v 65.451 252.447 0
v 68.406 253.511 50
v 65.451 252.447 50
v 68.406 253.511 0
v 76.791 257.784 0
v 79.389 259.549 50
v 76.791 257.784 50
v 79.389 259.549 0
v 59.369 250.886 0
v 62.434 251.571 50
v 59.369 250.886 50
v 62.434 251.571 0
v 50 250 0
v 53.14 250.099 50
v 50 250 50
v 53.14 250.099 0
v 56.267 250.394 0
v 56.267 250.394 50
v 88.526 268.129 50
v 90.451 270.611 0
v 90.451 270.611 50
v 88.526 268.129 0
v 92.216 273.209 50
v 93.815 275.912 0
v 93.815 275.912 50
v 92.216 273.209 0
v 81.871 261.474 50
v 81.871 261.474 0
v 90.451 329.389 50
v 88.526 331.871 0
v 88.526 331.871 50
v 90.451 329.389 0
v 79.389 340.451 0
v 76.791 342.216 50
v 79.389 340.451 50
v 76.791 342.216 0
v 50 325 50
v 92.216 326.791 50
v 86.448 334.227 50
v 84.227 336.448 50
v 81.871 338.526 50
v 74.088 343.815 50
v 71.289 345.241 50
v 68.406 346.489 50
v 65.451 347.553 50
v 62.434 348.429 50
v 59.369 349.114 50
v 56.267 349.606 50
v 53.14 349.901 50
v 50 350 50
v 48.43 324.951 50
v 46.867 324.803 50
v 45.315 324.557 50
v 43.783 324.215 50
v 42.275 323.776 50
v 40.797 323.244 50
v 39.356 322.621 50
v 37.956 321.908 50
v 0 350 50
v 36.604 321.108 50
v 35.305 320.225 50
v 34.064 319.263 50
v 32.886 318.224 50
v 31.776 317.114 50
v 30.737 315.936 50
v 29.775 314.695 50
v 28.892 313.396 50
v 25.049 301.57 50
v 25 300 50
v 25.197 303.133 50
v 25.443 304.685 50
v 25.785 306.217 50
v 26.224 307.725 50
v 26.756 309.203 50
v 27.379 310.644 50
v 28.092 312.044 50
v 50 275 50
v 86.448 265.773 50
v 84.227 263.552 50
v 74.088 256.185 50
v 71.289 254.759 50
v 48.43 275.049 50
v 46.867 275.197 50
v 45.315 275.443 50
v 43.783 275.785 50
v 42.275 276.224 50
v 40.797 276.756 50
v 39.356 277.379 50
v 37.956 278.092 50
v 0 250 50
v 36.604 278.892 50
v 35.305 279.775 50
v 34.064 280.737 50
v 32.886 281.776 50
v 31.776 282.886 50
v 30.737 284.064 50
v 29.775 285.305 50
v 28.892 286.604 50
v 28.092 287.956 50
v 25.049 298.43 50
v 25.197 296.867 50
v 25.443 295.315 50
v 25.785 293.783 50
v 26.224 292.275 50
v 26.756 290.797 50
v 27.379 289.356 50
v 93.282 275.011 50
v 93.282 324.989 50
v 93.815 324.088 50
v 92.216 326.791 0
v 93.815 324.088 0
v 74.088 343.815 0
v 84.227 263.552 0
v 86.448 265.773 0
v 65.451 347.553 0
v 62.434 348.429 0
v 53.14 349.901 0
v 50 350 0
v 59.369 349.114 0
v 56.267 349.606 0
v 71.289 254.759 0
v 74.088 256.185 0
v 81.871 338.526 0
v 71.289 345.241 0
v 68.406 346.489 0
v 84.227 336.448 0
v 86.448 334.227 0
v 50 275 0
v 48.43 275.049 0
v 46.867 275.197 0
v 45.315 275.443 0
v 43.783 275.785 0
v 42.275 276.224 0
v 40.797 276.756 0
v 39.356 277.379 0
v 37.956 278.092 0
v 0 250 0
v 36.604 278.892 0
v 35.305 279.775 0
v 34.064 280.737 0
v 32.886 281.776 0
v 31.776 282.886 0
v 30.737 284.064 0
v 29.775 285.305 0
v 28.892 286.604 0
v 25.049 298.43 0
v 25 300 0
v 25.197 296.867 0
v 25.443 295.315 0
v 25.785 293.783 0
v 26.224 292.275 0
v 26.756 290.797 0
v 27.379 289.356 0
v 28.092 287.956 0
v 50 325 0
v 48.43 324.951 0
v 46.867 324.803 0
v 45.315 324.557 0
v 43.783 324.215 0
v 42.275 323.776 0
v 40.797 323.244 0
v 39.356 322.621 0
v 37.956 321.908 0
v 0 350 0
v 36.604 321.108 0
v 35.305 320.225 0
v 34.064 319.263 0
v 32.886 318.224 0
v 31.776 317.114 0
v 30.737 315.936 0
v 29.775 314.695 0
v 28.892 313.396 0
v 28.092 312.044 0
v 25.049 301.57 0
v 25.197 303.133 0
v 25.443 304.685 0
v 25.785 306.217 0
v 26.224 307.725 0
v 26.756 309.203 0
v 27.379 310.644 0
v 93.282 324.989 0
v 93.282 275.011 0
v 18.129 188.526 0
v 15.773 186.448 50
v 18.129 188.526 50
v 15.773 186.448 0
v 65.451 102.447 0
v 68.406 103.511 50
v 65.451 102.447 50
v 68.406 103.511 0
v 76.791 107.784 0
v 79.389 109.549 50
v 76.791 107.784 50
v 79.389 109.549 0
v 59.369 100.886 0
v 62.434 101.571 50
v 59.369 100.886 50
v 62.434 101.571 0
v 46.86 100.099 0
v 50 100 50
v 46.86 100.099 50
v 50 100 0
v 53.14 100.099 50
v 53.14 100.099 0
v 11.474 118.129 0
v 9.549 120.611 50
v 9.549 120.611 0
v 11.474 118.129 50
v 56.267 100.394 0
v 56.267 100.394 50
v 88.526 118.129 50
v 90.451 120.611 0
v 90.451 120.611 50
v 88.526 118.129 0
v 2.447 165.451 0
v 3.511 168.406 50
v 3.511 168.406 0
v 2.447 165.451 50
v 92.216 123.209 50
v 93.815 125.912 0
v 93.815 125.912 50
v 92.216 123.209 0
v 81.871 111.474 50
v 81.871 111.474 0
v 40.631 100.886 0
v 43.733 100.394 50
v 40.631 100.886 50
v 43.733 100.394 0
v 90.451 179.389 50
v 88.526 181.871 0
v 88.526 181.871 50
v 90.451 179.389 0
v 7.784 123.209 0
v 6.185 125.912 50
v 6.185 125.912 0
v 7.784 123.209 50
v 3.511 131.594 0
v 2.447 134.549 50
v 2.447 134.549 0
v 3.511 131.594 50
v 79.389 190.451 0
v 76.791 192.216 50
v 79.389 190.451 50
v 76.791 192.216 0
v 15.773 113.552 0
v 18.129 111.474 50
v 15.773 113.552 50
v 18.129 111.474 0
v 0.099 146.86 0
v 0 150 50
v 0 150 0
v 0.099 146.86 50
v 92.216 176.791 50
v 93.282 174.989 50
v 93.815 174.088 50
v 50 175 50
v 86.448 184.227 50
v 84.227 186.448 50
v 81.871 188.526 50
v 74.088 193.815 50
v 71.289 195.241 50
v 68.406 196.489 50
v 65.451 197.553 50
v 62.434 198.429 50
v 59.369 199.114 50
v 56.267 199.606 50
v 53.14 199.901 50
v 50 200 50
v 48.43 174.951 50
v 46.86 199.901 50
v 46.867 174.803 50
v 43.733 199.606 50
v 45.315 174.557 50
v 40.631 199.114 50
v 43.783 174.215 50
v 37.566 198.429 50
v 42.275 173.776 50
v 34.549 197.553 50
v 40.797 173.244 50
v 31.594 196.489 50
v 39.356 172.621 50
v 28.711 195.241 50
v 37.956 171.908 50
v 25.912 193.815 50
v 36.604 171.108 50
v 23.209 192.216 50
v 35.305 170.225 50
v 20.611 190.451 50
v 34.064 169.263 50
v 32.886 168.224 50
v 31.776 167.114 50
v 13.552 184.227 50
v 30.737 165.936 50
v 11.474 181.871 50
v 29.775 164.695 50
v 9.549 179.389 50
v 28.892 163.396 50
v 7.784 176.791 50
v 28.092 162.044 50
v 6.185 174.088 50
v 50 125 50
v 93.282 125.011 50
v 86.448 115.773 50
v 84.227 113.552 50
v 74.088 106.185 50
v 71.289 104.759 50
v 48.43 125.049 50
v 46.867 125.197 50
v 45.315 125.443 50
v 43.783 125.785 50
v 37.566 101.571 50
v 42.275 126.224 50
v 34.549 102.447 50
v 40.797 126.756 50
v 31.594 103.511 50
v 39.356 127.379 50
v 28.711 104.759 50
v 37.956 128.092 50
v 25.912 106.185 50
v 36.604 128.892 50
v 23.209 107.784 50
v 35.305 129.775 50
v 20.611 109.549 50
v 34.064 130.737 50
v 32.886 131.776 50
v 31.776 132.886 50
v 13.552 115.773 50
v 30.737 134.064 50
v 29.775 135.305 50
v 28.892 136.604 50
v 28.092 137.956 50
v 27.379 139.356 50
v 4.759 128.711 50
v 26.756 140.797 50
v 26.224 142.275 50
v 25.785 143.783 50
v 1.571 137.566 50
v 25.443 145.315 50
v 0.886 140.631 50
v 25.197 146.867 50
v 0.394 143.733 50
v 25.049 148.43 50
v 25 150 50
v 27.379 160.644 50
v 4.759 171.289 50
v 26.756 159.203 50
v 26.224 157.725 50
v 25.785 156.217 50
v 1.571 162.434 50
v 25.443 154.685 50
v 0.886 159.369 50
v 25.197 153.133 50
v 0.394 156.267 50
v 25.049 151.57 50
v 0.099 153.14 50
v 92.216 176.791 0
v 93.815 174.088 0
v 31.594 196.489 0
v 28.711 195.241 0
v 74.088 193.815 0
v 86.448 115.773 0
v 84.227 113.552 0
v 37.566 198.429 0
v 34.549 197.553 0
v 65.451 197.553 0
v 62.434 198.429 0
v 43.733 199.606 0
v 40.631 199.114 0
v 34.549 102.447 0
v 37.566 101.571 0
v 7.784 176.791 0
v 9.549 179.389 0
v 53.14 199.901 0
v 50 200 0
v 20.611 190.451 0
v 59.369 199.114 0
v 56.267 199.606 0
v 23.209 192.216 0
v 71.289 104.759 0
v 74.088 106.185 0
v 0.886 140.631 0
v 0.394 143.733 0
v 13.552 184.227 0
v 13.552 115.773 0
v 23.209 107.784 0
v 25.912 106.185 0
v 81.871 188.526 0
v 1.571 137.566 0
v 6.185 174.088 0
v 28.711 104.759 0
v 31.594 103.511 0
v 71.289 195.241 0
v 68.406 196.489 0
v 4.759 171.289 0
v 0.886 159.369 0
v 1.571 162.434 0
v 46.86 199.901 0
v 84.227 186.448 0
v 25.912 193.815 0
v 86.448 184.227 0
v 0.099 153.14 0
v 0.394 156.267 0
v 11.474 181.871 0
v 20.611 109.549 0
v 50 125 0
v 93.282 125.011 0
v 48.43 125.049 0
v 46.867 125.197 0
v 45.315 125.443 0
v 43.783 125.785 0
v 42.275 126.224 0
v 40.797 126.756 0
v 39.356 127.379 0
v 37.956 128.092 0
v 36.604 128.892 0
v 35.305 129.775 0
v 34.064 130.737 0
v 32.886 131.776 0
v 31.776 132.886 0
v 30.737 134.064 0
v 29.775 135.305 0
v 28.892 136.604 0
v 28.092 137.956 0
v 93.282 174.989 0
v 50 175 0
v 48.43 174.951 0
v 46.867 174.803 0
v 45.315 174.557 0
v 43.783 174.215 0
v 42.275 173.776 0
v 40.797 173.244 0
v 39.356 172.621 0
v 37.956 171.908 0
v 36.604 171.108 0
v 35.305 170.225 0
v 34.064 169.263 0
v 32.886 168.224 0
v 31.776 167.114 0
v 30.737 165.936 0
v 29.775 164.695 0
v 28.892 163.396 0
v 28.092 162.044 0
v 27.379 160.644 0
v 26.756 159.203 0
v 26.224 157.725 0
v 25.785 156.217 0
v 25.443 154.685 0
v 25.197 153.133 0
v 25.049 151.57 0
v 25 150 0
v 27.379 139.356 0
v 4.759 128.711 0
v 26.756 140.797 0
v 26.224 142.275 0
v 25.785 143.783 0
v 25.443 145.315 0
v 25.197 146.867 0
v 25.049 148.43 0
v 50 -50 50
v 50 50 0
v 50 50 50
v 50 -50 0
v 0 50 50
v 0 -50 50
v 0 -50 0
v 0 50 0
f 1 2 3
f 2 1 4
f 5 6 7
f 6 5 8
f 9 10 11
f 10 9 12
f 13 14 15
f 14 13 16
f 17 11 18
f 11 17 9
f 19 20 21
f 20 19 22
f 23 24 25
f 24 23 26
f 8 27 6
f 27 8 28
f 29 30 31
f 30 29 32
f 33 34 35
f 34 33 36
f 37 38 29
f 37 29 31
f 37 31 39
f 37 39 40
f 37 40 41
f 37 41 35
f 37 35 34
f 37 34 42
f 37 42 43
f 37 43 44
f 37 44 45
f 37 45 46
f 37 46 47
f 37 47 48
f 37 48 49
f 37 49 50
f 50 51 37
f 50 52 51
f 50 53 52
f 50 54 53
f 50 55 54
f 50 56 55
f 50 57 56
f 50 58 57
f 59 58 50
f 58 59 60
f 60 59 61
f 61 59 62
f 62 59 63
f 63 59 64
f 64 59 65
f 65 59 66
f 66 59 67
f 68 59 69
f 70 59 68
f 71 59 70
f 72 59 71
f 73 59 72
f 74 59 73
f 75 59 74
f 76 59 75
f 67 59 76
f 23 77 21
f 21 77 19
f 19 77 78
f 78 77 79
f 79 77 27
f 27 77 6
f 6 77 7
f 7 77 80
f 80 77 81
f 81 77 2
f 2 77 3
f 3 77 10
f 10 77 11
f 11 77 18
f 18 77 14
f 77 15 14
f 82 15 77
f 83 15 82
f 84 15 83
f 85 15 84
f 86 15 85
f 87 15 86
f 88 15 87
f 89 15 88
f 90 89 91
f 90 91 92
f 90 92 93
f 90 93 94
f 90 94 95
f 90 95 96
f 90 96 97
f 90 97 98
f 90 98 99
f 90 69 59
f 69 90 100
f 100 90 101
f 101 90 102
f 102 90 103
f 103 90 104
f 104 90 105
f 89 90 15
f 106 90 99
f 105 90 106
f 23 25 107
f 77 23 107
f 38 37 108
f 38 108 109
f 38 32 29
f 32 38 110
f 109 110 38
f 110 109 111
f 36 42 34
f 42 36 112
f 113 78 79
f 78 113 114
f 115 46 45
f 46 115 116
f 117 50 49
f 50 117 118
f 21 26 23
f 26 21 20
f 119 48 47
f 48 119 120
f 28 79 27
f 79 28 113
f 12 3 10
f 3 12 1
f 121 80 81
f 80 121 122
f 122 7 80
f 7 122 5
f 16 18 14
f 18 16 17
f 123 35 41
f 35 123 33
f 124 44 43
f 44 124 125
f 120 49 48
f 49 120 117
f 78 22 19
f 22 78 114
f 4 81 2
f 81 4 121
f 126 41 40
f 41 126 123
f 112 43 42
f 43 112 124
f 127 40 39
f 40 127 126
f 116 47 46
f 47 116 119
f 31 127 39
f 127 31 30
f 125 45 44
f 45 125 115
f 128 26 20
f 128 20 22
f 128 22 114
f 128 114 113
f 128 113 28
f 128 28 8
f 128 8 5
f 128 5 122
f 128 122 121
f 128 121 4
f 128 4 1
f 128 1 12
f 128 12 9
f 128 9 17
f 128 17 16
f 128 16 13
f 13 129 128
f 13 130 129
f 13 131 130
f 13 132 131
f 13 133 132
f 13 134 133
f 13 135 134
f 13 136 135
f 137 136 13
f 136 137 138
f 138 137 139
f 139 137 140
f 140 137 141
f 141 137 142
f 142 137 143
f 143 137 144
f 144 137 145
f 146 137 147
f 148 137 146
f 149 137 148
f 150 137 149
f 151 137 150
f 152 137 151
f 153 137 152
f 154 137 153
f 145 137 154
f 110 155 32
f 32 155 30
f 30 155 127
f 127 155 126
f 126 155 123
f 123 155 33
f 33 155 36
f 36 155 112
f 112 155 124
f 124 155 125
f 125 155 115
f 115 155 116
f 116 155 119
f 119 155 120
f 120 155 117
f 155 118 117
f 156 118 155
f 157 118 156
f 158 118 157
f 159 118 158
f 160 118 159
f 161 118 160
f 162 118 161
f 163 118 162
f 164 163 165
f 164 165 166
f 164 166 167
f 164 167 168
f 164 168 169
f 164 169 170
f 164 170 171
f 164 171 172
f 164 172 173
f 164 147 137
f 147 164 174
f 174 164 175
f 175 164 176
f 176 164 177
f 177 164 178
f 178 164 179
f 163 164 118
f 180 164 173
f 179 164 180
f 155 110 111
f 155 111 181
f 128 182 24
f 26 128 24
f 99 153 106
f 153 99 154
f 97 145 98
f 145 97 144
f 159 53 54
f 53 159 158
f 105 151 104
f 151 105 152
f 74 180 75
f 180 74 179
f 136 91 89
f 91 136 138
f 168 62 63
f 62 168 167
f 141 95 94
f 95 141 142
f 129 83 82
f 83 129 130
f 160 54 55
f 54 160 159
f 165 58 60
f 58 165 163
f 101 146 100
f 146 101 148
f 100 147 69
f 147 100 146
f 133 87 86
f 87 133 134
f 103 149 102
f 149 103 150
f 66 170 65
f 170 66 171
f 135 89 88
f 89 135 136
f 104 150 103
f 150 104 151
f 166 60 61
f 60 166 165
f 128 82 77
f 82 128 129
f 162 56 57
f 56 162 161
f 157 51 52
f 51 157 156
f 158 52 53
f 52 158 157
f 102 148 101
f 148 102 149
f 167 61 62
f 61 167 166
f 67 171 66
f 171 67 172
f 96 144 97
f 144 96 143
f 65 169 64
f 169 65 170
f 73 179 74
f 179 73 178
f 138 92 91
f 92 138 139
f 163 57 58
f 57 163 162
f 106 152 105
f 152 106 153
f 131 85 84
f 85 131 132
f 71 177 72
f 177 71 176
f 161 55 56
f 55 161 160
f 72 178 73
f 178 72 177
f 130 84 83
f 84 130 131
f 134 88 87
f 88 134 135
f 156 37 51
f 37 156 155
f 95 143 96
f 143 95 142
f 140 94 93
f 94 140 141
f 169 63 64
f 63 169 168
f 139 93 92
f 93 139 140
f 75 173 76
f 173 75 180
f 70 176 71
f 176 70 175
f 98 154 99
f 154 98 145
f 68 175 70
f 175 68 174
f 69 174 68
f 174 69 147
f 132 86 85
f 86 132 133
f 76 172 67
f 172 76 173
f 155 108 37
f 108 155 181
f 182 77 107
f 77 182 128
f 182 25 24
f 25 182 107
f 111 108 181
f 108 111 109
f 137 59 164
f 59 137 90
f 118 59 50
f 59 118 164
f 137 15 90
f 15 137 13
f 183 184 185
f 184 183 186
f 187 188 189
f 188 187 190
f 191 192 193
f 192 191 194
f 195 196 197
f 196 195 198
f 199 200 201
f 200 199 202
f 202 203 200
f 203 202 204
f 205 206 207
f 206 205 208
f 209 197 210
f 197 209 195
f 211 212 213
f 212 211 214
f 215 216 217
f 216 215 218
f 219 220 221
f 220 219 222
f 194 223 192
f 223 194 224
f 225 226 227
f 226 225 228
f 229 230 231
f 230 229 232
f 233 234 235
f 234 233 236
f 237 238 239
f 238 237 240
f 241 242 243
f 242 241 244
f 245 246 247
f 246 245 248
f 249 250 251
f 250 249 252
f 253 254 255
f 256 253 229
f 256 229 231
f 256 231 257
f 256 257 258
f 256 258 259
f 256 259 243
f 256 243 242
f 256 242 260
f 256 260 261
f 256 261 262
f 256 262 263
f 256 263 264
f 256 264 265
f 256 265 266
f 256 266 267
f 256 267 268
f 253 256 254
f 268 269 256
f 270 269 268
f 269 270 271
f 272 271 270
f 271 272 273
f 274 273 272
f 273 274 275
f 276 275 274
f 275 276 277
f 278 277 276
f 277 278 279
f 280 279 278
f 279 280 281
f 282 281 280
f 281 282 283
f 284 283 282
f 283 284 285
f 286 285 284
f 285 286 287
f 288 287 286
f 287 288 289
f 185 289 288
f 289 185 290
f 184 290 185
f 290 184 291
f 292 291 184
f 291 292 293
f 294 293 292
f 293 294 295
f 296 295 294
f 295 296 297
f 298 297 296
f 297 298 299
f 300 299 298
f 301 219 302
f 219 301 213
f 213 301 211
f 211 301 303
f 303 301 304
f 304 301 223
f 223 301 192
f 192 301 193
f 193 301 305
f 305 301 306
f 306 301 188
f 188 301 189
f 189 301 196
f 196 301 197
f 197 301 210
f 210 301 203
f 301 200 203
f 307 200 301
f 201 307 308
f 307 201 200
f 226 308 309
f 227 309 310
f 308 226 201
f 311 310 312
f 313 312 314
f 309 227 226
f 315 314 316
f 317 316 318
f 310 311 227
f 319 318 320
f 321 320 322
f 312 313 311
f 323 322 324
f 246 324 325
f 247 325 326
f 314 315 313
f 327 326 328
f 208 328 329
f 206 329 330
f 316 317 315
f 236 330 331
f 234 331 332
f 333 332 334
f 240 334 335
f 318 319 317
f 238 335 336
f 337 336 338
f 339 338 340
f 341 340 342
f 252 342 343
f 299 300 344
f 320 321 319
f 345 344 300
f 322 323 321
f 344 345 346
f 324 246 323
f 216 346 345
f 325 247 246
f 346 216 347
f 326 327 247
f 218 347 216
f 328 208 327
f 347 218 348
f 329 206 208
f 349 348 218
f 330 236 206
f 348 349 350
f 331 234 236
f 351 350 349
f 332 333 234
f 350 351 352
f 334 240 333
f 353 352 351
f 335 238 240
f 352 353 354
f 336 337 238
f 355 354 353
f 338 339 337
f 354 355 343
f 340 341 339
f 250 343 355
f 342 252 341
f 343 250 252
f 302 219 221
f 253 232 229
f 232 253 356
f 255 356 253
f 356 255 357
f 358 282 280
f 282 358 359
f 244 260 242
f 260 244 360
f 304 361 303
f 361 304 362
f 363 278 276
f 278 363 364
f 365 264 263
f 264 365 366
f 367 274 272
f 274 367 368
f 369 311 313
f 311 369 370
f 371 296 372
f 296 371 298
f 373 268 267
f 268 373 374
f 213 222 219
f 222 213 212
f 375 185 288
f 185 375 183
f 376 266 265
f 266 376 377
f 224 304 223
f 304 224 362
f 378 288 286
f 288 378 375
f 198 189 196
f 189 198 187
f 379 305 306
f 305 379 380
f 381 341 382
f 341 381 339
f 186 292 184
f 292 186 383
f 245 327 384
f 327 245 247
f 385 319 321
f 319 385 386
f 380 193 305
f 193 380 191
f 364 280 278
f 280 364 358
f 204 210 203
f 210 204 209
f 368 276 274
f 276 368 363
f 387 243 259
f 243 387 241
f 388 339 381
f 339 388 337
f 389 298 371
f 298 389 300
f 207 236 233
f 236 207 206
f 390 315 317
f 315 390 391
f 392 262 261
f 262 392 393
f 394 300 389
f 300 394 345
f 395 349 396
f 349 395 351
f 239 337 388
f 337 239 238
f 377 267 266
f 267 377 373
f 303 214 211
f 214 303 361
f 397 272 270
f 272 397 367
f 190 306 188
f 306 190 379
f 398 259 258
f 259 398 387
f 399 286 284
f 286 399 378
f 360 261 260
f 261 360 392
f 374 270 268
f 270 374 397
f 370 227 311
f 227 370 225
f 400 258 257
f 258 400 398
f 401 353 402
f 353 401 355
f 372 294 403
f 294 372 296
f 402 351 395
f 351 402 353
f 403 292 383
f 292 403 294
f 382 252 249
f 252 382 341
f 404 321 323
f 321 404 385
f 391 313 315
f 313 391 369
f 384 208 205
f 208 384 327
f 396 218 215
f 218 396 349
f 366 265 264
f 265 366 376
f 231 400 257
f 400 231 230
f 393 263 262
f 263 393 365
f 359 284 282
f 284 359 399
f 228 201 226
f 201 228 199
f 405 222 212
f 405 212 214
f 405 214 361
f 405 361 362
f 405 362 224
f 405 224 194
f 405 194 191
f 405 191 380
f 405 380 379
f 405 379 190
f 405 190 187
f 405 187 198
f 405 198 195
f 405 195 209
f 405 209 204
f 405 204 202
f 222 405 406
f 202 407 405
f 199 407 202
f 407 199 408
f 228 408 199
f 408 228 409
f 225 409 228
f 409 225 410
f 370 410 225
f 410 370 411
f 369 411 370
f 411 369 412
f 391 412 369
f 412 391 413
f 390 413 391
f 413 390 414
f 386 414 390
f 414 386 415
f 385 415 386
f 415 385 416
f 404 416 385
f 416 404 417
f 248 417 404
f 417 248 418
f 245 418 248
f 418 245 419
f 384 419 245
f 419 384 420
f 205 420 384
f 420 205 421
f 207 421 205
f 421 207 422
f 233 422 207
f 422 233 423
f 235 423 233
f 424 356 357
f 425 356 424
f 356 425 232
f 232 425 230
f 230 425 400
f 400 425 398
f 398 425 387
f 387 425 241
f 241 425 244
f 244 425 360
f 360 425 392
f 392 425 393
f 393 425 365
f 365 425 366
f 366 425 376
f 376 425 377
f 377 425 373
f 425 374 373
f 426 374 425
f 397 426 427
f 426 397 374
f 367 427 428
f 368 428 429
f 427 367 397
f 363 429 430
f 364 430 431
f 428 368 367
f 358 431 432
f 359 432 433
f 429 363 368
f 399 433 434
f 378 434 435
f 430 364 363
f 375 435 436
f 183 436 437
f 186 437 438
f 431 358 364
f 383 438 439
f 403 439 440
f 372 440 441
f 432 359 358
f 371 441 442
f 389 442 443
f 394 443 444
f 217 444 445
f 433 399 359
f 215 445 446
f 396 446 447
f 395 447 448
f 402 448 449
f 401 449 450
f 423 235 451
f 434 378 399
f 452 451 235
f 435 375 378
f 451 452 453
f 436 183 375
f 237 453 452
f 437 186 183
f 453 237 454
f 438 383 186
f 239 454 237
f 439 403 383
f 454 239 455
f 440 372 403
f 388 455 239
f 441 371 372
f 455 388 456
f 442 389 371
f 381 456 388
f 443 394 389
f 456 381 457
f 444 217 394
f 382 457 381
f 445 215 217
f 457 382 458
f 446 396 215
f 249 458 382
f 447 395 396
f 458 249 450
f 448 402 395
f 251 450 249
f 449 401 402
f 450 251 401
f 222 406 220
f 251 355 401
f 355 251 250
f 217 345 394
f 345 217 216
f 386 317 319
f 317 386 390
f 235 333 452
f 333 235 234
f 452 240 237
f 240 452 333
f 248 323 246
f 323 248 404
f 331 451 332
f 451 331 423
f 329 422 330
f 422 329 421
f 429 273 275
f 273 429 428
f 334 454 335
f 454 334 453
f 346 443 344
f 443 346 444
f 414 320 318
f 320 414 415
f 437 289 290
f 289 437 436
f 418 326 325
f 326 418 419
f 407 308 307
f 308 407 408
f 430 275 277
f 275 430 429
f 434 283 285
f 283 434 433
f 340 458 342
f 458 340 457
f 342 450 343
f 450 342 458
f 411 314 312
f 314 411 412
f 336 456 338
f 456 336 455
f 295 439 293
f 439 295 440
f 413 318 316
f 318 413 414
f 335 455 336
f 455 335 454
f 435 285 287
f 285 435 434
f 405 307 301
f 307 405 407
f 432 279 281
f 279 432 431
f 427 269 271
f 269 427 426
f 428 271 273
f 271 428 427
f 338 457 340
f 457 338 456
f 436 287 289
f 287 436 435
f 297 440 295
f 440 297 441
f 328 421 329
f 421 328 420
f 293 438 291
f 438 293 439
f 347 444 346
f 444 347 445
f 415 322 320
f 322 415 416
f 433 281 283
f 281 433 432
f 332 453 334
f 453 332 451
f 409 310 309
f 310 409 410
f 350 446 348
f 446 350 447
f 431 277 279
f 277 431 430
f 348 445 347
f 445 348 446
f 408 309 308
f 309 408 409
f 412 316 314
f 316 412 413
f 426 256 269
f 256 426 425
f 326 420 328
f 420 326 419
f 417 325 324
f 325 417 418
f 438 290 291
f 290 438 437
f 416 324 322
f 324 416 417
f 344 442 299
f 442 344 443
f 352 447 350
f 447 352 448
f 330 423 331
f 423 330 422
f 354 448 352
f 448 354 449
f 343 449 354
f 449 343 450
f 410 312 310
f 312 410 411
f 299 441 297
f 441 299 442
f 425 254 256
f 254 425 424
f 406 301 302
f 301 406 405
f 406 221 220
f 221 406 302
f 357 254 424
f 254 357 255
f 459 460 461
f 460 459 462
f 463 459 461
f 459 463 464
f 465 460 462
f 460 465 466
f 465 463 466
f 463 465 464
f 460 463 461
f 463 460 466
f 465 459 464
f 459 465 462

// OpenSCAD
$fn=100;
$vpt=[0,150,0];
$vpr=[40,0,90];
$vpd=800;
use <../../lib.scad>

module block(){
	translate([0,-50,0]){
		cube([50,100,50]);}}

module claw(){
	render(){
		translate(forward(50)){
			annulus(ro=50,ri=25,t=50,
							cut_tangent=true,
							cut_symmetric=true);}}}

translate(right(300)){
	color("green"){
		render(){
			outer_glue(){
				claw();
				block();}}}}

translate(right(150)){
	color("red"){
		claw();}}

color("blue"){
	block();}
